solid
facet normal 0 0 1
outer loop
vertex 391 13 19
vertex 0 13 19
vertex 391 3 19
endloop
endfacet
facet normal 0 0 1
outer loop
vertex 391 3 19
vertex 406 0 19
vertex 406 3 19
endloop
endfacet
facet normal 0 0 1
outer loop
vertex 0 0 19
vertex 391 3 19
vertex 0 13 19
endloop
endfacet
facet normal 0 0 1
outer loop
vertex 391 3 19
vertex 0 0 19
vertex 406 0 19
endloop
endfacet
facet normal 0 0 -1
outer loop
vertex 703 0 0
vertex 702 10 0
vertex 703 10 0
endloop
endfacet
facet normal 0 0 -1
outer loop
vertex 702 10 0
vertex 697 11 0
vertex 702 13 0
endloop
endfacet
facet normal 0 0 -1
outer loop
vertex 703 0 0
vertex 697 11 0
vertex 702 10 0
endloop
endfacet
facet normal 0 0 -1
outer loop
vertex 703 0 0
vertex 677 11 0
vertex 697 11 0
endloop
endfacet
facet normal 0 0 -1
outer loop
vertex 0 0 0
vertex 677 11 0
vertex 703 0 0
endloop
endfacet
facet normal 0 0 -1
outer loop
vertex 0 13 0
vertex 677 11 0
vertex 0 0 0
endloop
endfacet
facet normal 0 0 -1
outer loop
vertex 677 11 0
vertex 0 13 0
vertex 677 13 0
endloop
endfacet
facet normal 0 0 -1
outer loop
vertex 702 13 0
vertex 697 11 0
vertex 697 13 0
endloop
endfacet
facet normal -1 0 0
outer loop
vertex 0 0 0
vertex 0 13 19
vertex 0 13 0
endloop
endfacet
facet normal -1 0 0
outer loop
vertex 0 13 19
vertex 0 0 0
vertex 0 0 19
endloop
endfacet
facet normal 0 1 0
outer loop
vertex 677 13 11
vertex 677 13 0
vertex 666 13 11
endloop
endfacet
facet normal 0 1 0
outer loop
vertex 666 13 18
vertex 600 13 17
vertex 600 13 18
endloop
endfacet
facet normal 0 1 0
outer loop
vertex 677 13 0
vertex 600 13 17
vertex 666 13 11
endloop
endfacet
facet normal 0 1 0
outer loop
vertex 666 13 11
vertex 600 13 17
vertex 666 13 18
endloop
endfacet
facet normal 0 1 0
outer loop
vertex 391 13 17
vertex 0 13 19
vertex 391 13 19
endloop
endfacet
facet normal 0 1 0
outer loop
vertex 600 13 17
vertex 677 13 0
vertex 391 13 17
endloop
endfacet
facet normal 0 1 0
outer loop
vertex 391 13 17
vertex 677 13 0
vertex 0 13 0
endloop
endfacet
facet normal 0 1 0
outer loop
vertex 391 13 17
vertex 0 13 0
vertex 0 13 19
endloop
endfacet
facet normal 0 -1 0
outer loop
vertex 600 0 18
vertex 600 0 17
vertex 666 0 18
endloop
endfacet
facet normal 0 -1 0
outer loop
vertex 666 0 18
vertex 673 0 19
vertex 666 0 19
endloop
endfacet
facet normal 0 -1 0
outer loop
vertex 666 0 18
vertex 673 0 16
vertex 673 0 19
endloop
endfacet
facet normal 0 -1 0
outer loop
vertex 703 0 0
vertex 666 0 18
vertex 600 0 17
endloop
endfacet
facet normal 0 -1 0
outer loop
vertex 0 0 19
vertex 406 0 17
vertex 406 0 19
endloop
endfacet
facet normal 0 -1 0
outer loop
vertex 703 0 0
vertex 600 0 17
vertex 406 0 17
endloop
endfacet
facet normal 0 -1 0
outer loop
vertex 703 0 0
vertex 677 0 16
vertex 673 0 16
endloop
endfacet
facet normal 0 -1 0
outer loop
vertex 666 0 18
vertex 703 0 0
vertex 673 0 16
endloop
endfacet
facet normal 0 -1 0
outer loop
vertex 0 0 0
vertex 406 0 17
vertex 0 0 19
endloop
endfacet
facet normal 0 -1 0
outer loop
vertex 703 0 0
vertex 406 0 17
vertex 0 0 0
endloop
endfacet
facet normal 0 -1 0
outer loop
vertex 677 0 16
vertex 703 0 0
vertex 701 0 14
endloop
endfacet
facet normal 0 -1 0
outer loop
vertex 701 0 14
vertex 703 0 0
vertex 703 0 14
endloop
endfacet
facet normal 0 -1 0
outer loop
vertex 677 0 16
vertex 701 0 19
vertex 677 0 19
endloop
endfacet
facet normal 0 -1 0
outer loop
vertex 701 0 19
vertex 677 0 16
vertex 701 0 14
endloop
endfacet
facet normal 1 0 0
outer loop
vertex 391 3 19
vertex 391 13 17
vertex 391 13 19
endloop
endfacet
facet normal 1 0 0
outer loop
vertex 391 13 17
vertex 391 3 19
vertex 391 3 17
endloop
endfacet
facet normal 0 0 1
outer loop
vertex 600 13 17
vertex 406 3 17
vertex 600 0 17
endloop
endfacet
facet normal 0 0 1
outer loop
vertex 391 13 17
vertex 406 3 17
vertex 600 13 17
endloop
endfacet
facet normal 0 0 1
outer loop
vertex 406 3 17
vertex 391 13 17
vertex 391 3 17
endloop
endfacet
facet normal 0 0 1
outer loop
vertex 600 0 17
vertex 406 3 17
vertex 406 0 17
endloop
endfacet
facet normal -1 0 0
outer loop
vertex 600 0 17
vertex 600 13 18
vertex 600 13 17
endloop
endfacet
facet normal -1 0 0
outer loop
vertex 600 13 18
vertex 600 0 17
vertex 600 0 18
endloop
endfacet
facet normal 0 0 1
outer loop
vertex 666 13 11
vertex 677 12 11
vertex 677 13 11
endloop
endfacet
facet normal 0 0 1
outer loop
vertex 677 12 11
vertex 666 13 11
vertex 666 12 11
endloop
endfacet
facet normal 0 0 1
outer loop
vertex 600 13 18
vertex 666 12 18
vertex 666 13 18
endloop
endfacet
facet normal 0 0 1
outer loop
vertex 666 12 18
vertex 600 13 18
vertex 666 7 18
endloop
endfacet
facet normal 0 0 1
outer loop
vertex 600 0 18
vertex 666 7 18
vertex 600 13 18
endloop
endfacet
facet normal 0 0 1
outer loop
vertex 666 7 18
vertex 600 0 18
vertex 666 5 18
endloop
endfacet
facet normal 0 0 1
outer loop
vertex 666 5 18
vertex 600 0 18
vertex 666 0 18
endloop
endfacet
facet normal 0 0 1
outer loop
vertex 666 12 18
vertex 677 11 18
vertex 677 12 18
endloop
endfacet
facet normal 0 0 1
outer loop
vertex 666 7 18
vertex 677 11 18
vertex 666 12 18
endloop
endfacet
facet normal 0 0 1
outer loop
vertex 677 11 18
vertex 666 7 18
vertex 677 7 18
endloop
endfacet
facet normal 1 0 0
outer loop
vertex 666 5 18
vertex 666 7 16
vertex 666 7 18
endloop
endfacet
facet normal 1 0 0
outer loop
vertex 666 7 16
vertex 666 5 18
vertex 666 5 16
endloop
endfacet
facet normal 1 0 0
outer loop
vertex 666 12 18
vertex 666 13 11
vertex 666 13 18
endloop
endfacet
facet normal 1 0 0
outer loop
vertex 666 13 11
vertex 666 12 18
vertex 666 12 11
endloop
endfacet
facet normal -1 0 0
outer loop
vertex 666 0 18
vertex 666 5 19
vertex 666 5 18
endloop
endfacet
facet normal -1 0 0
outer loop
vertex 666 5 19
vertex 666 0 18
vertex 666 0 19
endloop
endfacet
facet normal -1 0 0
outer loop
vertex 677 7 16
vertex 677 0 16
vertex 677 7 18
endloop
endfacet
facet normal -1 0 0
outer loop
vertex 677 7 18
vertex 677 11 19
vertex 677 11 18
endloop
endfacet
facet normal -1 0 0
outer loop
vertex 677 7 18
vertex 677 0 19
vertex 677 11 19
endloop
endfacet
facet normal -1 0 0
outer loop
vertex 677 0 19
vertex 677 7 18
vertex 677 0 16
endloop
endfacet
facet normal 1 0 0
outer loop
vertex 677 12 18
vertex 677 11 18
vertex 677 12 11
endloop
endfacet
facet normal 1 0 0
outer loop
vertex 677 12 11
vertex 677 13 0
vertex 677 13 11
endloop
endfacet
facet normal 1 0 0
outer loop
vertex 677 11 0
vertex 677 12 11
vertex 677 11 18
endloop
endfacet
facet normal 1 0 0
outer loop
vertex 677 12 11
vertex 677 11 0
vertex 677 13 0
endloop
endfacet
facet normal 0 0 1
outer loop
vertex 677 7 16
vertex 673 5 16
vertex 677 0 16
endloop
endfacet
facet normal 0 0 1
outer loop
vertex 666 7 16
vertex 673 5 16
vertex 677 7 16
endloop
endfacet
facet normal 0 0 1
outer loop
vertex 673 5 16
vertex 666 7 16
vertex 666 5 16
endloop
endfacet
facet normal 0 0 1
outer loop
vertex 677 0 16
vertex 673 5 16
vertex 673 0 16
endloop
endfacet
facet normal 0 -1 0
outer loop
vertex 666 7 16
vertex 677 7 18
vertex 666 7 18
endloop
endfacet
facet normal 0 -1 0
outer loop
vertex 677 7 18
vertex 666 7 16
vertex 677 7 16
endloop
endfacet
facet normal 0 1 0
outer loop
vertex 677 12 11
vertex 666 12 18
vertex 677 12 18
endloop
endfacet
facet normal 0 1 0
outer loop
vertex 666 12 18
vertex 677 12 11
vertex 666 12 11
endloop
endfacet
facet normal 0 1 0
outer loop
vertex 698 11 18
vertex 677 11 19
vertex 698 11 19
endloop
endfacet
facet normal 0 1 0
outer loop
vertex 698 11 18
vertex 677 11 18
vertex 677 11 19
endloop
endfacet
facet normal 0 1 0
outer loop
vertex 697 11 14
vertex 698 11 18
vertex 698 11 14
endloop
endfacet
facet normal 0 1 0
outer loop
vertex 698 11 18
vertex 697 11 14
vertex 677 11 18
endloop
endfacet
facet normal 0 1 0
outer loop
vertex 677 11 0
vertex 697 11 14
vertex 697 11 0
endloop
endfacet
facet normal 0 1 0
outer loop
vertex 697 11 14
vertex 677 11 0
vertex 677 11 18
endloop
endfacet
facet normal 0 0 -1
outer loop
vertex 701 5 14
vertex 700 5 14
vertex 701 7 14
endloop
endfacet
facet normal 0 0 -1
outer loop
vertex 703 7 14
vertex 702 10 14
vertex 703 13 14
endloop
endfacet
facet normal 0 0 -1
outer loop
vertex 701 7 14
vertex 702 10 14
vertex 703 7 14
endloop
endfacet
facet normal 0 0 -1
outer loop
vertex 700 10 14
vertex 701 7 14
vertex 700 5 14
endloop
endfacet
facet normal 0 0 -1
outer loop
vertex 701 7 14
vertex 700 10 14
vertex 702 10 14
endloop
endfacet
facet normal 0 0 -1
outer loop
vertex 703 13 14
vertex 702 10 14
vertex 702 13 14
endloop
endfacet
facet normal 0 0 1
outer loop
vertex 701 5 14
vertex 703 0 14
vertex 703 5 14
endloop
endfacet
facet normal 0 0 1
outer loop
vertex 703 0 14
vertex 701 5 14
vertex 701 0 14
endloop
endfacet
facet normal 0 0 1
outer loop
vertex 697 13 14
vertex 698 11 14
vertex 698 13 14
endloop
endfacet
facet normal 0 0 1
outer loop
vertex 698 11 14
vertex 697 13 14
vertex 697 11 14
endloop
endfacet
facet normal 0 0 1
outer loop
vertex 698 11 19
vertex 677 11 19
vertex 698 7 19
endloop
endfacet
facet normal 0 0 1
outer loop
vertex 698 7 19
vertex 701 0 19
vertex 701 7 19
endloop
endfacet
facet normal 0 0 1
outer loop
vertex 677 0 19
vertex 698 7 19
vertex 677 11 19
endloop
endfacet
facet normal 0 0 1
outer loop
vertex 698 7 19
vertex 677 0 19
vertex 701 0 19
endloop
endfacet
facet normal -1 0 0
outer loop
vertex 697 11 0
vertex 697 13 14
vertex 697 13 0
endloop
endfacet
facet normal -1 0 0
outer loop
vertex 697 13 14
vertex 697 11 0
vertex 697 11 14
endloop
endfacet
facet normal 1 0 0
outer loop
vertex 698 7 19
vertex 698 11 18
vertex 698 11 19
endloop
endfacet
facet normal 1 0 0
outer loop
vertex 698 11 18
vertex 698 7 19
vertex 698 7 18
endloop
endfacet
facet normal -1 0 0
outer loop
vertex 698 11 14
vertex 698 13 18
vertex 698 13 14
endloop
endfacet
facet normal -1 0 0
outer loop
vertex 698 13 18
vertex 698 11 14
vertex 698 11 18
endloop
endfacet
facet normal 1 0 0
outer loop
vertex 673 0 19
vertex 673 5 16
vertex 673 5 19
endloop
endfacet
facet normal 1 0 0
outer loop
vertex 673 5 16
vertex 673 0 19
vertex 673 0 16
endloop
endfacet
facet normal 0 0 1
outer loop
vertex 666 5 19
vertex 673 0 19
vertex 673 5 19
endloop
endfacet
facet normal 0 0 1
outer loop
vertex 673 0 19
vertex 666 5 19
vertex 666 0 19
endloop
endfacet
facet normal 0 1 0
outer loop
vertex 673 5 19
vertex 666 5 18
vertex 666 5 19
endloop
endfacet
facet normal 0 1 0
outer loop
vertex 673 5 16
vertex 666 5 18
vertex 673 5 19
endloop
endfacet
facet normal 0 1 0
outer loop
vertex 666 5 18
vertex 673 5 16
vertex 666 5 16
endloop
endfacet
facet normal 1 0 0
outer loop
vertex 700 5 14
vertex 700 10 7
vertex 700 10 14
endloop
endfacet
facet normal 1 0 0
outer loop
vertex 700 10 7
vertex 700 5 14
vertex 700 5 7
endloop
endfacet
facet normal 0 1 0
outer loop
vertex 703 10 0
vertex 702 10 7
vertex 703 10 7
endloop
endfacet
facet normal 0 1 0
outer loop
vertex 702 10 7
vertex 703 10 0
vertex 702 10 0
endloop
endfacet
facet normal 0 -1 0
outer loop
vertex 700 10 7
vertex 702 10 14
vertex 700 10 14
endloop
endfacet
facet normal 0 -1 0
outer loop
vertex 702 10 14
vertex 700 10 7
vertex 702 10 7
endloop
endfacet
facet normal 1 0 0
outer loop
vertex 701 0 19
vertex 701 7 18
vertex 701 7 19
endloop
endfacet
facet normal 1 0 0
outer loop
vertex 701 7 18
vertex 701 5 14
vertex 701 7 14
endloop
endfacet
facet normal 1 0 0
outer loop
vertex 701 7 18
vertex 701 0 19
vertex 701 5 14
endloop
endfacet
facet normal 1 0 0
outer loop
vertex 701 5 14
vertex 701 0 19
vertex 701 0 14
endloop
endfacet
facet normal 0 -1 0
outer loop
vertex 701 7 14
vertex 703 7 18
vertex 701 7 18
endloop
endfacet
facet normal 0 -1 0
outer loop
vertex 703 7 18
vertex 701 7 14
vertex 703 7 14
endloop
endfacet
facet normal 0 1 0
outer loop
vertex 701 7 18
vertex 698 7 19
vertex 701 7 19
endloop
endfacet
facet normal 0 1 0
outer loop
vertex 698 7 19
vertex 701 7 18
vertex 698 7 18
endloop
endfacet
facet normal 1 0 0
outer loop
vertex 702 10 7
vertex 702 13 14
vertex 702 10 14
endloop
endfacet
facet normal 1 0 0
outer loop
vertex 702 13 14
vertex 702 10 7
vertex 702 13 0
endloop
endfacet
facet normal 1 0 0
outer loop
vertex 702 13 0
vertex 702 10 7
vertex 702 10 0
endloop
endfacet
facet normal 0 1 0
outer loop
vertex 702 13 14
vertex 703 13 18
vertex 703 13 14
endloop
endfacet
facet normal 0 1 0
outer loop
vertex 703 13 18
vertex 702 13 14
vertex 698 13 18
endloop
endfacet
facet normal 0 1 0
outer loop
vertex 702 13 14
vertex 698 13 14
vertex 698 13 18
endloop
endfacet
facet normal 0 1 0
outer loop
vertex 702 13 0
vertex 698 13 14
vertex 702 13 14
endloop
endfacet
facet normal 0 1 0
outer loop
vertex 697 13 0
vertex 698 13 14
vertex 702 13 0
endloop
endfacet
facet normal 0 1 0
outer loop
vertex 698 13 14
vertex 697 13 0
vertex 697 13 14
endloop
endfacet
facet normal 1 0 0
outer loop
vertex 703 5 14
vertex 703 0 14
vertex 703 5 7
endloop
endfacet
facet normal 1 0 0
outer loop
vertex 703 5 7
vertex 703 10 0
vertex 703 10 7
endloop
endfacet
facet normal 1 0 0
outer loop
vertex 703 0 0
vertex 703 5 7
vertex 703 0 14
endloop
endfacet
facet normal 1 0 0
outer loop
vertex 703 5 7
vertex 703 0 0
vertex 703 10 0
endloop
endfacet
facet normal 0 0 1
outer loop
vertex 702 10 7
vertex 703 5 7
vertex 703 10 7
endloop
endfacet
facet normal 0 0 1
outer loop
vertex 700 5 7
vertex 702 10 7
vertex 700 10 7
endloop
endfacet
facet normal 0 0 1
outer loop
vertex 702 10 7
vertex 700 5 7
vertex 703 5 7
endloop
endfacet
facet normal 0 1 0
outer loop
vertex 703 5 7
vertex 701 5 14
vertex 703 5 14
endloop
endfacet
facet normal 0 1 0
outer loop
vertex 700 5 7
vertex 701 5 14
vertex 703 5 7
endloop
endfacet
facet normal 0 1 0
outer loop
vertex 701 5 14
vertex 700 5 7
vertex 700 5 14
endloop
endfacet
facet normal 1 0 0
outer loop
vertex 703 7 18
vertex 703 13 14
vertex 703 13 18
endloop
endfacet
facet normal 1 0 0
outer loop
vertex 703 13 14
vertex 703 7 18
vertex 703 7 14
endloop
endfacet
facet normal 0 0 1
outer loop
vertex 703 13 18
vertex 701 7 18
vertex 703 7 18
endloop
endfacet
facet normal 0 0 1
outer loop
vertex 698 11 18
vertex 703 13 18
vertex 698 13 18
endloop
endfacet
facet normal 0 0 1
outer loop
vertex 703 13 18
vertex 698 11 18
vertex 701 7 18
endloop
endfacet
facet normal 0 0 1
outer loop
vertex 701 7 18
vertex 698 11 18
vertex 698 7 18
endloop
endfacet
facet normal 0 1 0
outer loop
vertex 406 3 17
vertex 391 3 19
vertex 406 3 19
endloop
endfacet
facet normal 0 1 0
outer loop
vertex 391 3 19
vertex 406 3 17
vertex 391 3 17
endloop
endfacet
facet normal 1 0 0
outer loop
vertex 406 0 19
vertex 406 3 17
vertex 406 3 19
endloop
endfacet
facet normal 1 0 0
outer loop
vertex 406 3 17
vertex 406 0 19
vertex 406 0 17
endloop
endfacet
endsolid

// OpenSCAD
translate([8.5, 6.5, 9.5]) color([0.6108926701450443, 0.8122678209742187, 0.5222627979471512]) cube([17, 13, 19], center=true);
translate([25.5, 6.5, 9.5]) color([0.7095307583634994, 0.9126687247694082, 0.13487625477079712]) cube([17, 13, 19], center=true);
translate([42.5, 6.5, 9.5]) color([0.7715208720856912, 0.05716454642595936, 0.08241654053773162]) cube([17, 13, 19], center=true);
translate([59.5, 6.5, 9.5]) color([0.5176706786705761, 0.0024604932439482585, 0.774865046739482]) cube([17, 13, 19], center=true);
translate([76.5, 6.5, 9.5]) color([0.10398133417765076, 0.6075408633971222, 0.5702741924791085]) cube([17, 13, 19], center=true);
translate([93.5, 6.5, 9.5]) color([0.335807396721168, 0.3780654483467295, 0.36205489178930694]) cube([17, 13, 19], center=true);
translate([110.5, 6.5, 9.5]) color([0.8413126085807436, 0.6365683683667089, 0.13610848275491239]) cube([17, 13, 19], center=true);
translate([127.5, 6.5, 9.5]) color([0.9255182446742467, 0.18259927432055334, 0.12509989752770068]) cube([17, 13, 19], center=true);
translate([144.5, 6.5, 9.5]) color([0.33788945440902196, 0.607477949510089, 0.04413950751599882]) cube([17, 13, 19], center=true);
translate([161.5, 6.5, 9.5]) color([0.6453929548117466, 0.6988419541065013, 0.7967664255910738]) cube([17, 13, 19], center=true);
translate([178.5, 6.5, 9.5]) color([0.9116718921976609, 0.600448770579328, 0.7944487907838055]) cube([17, 13, 19], center=true);
translate([195.5, 6.5, 9.5]) color([0.1681613799771936, 0.9183995562433641, 0.9268586566852167]) cube([17, 13, 19], center=true);
translate([212.5, 6.5, 9.5]) color([0.40822611044352053, 0.4407066729290805, 0.6041418306666712]) cube([17, 13, 19], center=true);
translate([229.5, 6.5, 9.5]) color([0.6201352905963935, 0.25582819932935885, 0.3097428572381714]) cube([17, 13, 19], center=true);
translate([246.5, 6.5, 9.5]) color([0.8490920052212889, 0.453637908490201, 0.18066627555108494]) cube([17, 13, 19], center=true);
translate([263.5, 6.5, 9.5]) color([0.4537290543496928, 0.2641493990309046, 0.9492851375614021]) cube([17, 13, 19], center=true);
translate([280.5, 6.5, 9.5]) color([0.06409274308092405, 0.09630522223834415, 0.02618666999626429]) cube([17, 13, 19], center=true);
translate([297.5, 6.5, 9.5]) color([0.02133712304448243, 0.40376331371079255, 0.6905719463038024]) cube([17, 13, 19], center=true);
translate([314.5, 6.5, 9.5]) color([0.8969992176715027, 0.32280326974746465, 0.790755737975632]) cube([17, 13, 19], center=true);
translate([331.5, 6.5, 9.5]) color([0.7460115169857665, 0.6948475129606672, 0.47653257906772517]) cube([17, 13, 19], center=true);
translate([348.5, 6.5, 9.5]) color([0.8579766307154586, 0.5356136848189613, 0.4019331618452773]) cube([17, 13, 19], center=true);
translate([365.5, 6.5, 9.5]) color([0.783713898498177, 0.9254696984756191, 0.0277966234683793]) cube([17, 13, 19], center=true);
translate([382.5, 6.5, 9.5]) color([0.5158650286176655, 0.8365998776746773, 0.08009244005093674]) cube([17, 13, 19], center=true);
translate([396.5, 6.5, 8.5]) color([0.35854963179787425, 0.0984859129144442, 0.9681463616569913]) cube([11, 13, 17], center=true);
translate([407.5, 6.5, 8.5]) color([0.1542718478221884, 0.5165971564168642, 0.8047430089643692]) cube([11, 13, 17], center=true);
translate([418.5, 6.5, 8.5]) color([0.9598305824160865, 0.0007265089205383823, 0.33769105491683293]) cube([11, 13, 17], center=true);
translate([429.5, 6.5, 8.5]) color([0.9444140087685011, 0.6959768172121321, 0.16055826227824588]) cube([11, 13, 17], center=true);
translate([440.5, 6.5, 8.5]) color([0.7793255516951493, 0.1589752259859445, 0.6798370424105331]) cube([11, 13, 17], center=true);
translate([451.5, 6.5, 8.5]) color([0.9431536263145228, 0.9341404857092784, 0.32827049453258017]) cube([11, 13, 17], center=true);
translate([462.5, 6.5, 8.5]) color([0.023848105094706917, 0.9585798448912861, 0.6258377632382796]) cube([11, 13, 17], center=true);
translate([473.5, 6.5, 8.5]) color([0.3981042954636257, 0.2264255750200933, 0.6356717667101055]) cube([11, 13, 17], center=true);
translate([484.5, 6.5, 8.5]) color([0.328569085672622, 0.9662245753272395, 0.3520821722301851]) cube([11, 13, 17], center=true);
translate([495.5, 6.5, 8.5]) color([0.16362135021644642, 0.42074777530803376, 0.36328644213461747]) cube([11, 13, 17], center=true);
translate([506.5, 6.5, 8.5]) color([0.5653807754665455, 0.3865100485452896, 0.7707594112565195]) cube([11, 13, 17], center=true);
translate([517.5, 6.5, 8.5]) color([0.16214085318372695, 0.5836514905515098, 0.6869400768720183]) cube([11, 13, 17], center=true);
translate([528.5, 6.5, 8.5]) color([0.718467099976435, 0.17196229100139104, 0.14887881293527583]) cube([11, 13, 17], center=true);
translate([539.5, 6.5, 8.5]) color([0.025166107893626943, 0.32332346968418324, 0.003696799562737496]) cube([11, 13, 17], center=true);
translate([550.5, 6.5, 8.5]) color([0.04720529747843194, 0.9255571895234466, 0.573001262631075]) cube([11, 13, 17], center=true);
translate([561.5, 6.5, 8.5]) color([0.14769469781462263, 0.15315209085934545, 0.7868491215994531]) cube([11, 13, 17], center=true);
translate([572.5, 6.5, 8.5]) color([0.7877029182496789, 0.4187372508366701, 0.5680438273675328]) cube([11, 13, 17], center=true);
translate([583.5, 6.5, 8.5]) color([0.6864311496386182, 0.7112052310106062, 0.9225367392437966]) cube([11, 13, 17], center=true);
translate([594.5, 6.5, 8.5]) color([0.36402675889620517, 0.21666285047939615, 0.40038769746607716]) cube([11, 13, 17], center=true);
translate([603.5, 6.5, 5.5]) color([0.12979762559949215, 0.5661089096865166, 0.350592866287013]) cube([7, 13, 11], center=true);
translate([605.5, 6.5, 14.5]) color([0.09655676358596321, 0.8957043173613797, 0.24564542972396286]) cube([11, 13, 7], center=true);
translate([610.5, 6.5, 5.5]) color([0.3817592950540295, 0.9163373365613642, 0.24005472395766314]) cube([7, 13, 11], center=true);
translate([617.5, 6.5, 5.5]) color([0.4811830401201487, 0.9204180358452778, 0.06901768472479497]) cube([7, 13, 11], center=true);
translate([616.5, 6.5, 14.5]) color([0.25236871091997304, 0.2758752397078251, 0.526585946767007]) cube([11, 13, 7], center=true);
translate([624.5, 6.5, 5.5]) color([0.5423400552699501, 0.6040332809955223, 0.7795947303962014]) cube([7, 13, 11], center=true);
translate([627.5, 6.5, 14.5]) color([0.8767515811101877, 0.27628184885013174, 0.6109665581700968]) cube([11, 13, 7], center=true);
translate([631.5, 6.5, 5.5]) color([0.8673330381368943, 0.39077563557117434, 0.6261021875341246]) cube([7, 13, 11], center=true);
translate([638.5, 6.5, 5.5]) color([0.5344719952169016, 0.8525626141482417, 0.1442072370162294]) cube([7, 13, 11], center=true);
translate([638.5, 6.5, 14.5]) color([0.39242938925918713, 0.7677442686337953, 0.7310024639236243]) cube([11, 13, 7], center=true);
translate([645.5, 6.5, 5.5]) color([0.976490023680837, 0.432956620488795, 0.10481875176128097]) cube([7, 13, 11], center=true);
translate([649.5, 6.5, 14.5]) color([0.4606863677813431, 0.461987586031698, 0.16960878923904732]) cube([11, 13, 7], center=true);
translate([652.5, 6.5, 5.5]) color([0.4743590683571708, 0.15900931947085895, 0.9184122383299332]) cube([7, 13, 11], center=true);
translate([659.5, 6.5, 5.5]) color([0.8645912802495788, 0.7618309073415613, 0.1125156501937501]) cube([7, 13, 11], center=true);
translate([660.5, 6.5, 14.5]) color([0.36828247715101237, 0.14269334546182144, 0.3576212954978014]) cube([11, 13, 7], center=true);
translate([666.5, 6.5, 5.5]) color([0.47267833076618404, 0.5187172796832821, 0.05390524264941354]) cube([7, 13, 11], center=true);
translate([673.5, 6.5, 5.5]) color([0.8771386739413267, 0.25763233882857706, 0.7234564765071956]) cube([7, 13, 11], center=true);
translate([671.5, 3.5, 13.5]) color([0.3246711887124375, 0.3801134723009394, 0.04146251299314507]) cube([11, 7, 5], center=true);
translate([671.5, 9.5, 14.5]) color([0.5514350789130729, 0.03490092368589748, 0.4105469306488987]) cube([11, 5, 7], center=true);
translate([679.5, 5.5, 3.5]) color([0.3751623833766272, 0.20817480494735885, 0.13416269520041413]) cube([5, 11, 7], center=true);
translate([679.5, 5.5, 10.5]) color([0.11029894361740877, 0.3569637027811857, 0.03122581862343432]) cube([5, 11, 7], center=true);
translate([680.5, 5.5, 16.5]) color([0.5766961902260587, 0.46351932045943167, 0.6418946885374921]) cube([7, 11, 5], center=true);
translate([684.5, 5.5, 3.5]) color([0.7070356211127606, 0.07782501561786981, 0.42542790282452947]) cube([5, 11, 7], center=true);
translate([684.5, 5.5, 10.5]) color([0.7262099352025745, 0.1383007479401901, 0.15296819960671582]) cube([5, 11, 7], center=true);
translate([687.5, 5.5, 16.5]) color([0.16447153857536234, 0.02972250823157674, 0.13555611535148748]) cube([7, 11, 5], center=true);
translate([689.5, 5.5, 3.5]) color([0.49304209170471214, 0.8998582652350663, 0.6233506257524957]) cube([5, 11, 7], center=true);
translate([689.5, 5.5, 10.5]) color([0.28803948846792526, 0.7932252536354372, 0.6841926136499455]) cube([5, 11, 7], center=true);
translate([694.5, 5.5, 3.5]) color([0.8025617596714979, 0.9141286153689818, 0.8380916000073253]) cube([5, 11, 7], center=true);
translate([694.5, 5.5, 10.5]) color([0.7734206085146829, 0.26176851167691584, 0.15831969188506612]) cube([5, 11, 7], center=true);
translate([694.5, 5.5, 16.5]) color([0.6279762350139132, 0.968532274155243, 0.5331314108905011]) cube([7, 11, 5], center=true);
translate([669.5, 2.5, 17.5]) color([0.14458049768334114, 0.3761389701406963, 0.7397992144806613]) cube([7, 5, 3], center=true);
translate([698.5, 2.5, 3.5]) color([0.5554788507911738, 0.2345364606417215, 0.9148239194796951]) cube([3, 5, 7], center=true);
translate([698.5, 7.5, 3.5]) color([0.37856658806298793, 0.39026506951982043, 0.4712732695903361]) cube([3, 5, 7], center=true);
translate([698.5, 2.5, 10.5]) color([0.3061585200178283, 0.41010119017851343, 0.4062986061941243]) cube([3, 5, 7], center=true);
translate([698.5, 7.5, 10.5]) color([0.09771277519641097, 0.9732189413459187, 0.1476462111243403]) cube([3, 5, 7], center=true);
translate([699.5, 3.5, 16.5]) color([0.5834920525213394, 0.6340513654385499, 0.981030210372344]) cube([3, 7, 5], center=true);
translate([699.5, 11.5, 3.5]) color([0.8814881035470955, 0.10681393516694448, 0.7792822990369496]) cube([5, 3, 7], center=true);
translate([699.5, 11.5, 10.5]) color([0.6980706766614326, 0.5957858833990998, 0.6031315697857828]) cube([5, 3, 7], center=true);
translate([701.5, 2.5, 3.5]) color([0.513452068799622, 0.26667928463625334, 0.7319196359388911]) cube([3, 5, 7], center=true);
translate([701.5, 7.5, 3.5]) color([0.16863726359497544, 0.08537701363375594, 0.03602107622091366]) cube([3, 5, 7], center=true);
translate([701.5, 2.5, 10.5]) color([0.11539851048895433, 0.362166522572666, 0.7224633804016175]) cube([3, 5, 7], center=true);
translate([700.5, 8.5, 15.0]) color([0.31835367611154275, 0.6759746033894163, 0.3690945326108701]) cube([5, 3, 2], center=true);
translate([700.5, 11.5, 15.0]) color([0.6966804657420774, 0.6665423027167577, 0.8120877428034601]) cube([5, 3, 2], center=true);
translate([700.5, 8.5, 17.0]) color([0.22871566506275376, 0.1590470788005368, 0.551630898022963]) cube([5, 3, 2], center=true);
translate([700.5, 11.5, 17.0]) color([0.8946771329487354, 0.7805199910429719, 0.5079920956553113]) cube([5, 3, 2], center=true);
translate([393.5, 1.5, 18.0]) color([0.8859418345093829, 0.025781518425698202, 0.6432115126368863]) cube([5, 3, 2], center=true);
translate([398.5, 1.5, 18.0]) color([0.16681516080095515, 0.9937350713993572, 0.40890136814306854]) cube([5, 3, 2], center=true);
translate([403.5, 1.5, 18.0]) color([0.6606487125760558, 0.4381854363391663, 0.6836690634862878]) cube([5, 3, 2], center=true);
